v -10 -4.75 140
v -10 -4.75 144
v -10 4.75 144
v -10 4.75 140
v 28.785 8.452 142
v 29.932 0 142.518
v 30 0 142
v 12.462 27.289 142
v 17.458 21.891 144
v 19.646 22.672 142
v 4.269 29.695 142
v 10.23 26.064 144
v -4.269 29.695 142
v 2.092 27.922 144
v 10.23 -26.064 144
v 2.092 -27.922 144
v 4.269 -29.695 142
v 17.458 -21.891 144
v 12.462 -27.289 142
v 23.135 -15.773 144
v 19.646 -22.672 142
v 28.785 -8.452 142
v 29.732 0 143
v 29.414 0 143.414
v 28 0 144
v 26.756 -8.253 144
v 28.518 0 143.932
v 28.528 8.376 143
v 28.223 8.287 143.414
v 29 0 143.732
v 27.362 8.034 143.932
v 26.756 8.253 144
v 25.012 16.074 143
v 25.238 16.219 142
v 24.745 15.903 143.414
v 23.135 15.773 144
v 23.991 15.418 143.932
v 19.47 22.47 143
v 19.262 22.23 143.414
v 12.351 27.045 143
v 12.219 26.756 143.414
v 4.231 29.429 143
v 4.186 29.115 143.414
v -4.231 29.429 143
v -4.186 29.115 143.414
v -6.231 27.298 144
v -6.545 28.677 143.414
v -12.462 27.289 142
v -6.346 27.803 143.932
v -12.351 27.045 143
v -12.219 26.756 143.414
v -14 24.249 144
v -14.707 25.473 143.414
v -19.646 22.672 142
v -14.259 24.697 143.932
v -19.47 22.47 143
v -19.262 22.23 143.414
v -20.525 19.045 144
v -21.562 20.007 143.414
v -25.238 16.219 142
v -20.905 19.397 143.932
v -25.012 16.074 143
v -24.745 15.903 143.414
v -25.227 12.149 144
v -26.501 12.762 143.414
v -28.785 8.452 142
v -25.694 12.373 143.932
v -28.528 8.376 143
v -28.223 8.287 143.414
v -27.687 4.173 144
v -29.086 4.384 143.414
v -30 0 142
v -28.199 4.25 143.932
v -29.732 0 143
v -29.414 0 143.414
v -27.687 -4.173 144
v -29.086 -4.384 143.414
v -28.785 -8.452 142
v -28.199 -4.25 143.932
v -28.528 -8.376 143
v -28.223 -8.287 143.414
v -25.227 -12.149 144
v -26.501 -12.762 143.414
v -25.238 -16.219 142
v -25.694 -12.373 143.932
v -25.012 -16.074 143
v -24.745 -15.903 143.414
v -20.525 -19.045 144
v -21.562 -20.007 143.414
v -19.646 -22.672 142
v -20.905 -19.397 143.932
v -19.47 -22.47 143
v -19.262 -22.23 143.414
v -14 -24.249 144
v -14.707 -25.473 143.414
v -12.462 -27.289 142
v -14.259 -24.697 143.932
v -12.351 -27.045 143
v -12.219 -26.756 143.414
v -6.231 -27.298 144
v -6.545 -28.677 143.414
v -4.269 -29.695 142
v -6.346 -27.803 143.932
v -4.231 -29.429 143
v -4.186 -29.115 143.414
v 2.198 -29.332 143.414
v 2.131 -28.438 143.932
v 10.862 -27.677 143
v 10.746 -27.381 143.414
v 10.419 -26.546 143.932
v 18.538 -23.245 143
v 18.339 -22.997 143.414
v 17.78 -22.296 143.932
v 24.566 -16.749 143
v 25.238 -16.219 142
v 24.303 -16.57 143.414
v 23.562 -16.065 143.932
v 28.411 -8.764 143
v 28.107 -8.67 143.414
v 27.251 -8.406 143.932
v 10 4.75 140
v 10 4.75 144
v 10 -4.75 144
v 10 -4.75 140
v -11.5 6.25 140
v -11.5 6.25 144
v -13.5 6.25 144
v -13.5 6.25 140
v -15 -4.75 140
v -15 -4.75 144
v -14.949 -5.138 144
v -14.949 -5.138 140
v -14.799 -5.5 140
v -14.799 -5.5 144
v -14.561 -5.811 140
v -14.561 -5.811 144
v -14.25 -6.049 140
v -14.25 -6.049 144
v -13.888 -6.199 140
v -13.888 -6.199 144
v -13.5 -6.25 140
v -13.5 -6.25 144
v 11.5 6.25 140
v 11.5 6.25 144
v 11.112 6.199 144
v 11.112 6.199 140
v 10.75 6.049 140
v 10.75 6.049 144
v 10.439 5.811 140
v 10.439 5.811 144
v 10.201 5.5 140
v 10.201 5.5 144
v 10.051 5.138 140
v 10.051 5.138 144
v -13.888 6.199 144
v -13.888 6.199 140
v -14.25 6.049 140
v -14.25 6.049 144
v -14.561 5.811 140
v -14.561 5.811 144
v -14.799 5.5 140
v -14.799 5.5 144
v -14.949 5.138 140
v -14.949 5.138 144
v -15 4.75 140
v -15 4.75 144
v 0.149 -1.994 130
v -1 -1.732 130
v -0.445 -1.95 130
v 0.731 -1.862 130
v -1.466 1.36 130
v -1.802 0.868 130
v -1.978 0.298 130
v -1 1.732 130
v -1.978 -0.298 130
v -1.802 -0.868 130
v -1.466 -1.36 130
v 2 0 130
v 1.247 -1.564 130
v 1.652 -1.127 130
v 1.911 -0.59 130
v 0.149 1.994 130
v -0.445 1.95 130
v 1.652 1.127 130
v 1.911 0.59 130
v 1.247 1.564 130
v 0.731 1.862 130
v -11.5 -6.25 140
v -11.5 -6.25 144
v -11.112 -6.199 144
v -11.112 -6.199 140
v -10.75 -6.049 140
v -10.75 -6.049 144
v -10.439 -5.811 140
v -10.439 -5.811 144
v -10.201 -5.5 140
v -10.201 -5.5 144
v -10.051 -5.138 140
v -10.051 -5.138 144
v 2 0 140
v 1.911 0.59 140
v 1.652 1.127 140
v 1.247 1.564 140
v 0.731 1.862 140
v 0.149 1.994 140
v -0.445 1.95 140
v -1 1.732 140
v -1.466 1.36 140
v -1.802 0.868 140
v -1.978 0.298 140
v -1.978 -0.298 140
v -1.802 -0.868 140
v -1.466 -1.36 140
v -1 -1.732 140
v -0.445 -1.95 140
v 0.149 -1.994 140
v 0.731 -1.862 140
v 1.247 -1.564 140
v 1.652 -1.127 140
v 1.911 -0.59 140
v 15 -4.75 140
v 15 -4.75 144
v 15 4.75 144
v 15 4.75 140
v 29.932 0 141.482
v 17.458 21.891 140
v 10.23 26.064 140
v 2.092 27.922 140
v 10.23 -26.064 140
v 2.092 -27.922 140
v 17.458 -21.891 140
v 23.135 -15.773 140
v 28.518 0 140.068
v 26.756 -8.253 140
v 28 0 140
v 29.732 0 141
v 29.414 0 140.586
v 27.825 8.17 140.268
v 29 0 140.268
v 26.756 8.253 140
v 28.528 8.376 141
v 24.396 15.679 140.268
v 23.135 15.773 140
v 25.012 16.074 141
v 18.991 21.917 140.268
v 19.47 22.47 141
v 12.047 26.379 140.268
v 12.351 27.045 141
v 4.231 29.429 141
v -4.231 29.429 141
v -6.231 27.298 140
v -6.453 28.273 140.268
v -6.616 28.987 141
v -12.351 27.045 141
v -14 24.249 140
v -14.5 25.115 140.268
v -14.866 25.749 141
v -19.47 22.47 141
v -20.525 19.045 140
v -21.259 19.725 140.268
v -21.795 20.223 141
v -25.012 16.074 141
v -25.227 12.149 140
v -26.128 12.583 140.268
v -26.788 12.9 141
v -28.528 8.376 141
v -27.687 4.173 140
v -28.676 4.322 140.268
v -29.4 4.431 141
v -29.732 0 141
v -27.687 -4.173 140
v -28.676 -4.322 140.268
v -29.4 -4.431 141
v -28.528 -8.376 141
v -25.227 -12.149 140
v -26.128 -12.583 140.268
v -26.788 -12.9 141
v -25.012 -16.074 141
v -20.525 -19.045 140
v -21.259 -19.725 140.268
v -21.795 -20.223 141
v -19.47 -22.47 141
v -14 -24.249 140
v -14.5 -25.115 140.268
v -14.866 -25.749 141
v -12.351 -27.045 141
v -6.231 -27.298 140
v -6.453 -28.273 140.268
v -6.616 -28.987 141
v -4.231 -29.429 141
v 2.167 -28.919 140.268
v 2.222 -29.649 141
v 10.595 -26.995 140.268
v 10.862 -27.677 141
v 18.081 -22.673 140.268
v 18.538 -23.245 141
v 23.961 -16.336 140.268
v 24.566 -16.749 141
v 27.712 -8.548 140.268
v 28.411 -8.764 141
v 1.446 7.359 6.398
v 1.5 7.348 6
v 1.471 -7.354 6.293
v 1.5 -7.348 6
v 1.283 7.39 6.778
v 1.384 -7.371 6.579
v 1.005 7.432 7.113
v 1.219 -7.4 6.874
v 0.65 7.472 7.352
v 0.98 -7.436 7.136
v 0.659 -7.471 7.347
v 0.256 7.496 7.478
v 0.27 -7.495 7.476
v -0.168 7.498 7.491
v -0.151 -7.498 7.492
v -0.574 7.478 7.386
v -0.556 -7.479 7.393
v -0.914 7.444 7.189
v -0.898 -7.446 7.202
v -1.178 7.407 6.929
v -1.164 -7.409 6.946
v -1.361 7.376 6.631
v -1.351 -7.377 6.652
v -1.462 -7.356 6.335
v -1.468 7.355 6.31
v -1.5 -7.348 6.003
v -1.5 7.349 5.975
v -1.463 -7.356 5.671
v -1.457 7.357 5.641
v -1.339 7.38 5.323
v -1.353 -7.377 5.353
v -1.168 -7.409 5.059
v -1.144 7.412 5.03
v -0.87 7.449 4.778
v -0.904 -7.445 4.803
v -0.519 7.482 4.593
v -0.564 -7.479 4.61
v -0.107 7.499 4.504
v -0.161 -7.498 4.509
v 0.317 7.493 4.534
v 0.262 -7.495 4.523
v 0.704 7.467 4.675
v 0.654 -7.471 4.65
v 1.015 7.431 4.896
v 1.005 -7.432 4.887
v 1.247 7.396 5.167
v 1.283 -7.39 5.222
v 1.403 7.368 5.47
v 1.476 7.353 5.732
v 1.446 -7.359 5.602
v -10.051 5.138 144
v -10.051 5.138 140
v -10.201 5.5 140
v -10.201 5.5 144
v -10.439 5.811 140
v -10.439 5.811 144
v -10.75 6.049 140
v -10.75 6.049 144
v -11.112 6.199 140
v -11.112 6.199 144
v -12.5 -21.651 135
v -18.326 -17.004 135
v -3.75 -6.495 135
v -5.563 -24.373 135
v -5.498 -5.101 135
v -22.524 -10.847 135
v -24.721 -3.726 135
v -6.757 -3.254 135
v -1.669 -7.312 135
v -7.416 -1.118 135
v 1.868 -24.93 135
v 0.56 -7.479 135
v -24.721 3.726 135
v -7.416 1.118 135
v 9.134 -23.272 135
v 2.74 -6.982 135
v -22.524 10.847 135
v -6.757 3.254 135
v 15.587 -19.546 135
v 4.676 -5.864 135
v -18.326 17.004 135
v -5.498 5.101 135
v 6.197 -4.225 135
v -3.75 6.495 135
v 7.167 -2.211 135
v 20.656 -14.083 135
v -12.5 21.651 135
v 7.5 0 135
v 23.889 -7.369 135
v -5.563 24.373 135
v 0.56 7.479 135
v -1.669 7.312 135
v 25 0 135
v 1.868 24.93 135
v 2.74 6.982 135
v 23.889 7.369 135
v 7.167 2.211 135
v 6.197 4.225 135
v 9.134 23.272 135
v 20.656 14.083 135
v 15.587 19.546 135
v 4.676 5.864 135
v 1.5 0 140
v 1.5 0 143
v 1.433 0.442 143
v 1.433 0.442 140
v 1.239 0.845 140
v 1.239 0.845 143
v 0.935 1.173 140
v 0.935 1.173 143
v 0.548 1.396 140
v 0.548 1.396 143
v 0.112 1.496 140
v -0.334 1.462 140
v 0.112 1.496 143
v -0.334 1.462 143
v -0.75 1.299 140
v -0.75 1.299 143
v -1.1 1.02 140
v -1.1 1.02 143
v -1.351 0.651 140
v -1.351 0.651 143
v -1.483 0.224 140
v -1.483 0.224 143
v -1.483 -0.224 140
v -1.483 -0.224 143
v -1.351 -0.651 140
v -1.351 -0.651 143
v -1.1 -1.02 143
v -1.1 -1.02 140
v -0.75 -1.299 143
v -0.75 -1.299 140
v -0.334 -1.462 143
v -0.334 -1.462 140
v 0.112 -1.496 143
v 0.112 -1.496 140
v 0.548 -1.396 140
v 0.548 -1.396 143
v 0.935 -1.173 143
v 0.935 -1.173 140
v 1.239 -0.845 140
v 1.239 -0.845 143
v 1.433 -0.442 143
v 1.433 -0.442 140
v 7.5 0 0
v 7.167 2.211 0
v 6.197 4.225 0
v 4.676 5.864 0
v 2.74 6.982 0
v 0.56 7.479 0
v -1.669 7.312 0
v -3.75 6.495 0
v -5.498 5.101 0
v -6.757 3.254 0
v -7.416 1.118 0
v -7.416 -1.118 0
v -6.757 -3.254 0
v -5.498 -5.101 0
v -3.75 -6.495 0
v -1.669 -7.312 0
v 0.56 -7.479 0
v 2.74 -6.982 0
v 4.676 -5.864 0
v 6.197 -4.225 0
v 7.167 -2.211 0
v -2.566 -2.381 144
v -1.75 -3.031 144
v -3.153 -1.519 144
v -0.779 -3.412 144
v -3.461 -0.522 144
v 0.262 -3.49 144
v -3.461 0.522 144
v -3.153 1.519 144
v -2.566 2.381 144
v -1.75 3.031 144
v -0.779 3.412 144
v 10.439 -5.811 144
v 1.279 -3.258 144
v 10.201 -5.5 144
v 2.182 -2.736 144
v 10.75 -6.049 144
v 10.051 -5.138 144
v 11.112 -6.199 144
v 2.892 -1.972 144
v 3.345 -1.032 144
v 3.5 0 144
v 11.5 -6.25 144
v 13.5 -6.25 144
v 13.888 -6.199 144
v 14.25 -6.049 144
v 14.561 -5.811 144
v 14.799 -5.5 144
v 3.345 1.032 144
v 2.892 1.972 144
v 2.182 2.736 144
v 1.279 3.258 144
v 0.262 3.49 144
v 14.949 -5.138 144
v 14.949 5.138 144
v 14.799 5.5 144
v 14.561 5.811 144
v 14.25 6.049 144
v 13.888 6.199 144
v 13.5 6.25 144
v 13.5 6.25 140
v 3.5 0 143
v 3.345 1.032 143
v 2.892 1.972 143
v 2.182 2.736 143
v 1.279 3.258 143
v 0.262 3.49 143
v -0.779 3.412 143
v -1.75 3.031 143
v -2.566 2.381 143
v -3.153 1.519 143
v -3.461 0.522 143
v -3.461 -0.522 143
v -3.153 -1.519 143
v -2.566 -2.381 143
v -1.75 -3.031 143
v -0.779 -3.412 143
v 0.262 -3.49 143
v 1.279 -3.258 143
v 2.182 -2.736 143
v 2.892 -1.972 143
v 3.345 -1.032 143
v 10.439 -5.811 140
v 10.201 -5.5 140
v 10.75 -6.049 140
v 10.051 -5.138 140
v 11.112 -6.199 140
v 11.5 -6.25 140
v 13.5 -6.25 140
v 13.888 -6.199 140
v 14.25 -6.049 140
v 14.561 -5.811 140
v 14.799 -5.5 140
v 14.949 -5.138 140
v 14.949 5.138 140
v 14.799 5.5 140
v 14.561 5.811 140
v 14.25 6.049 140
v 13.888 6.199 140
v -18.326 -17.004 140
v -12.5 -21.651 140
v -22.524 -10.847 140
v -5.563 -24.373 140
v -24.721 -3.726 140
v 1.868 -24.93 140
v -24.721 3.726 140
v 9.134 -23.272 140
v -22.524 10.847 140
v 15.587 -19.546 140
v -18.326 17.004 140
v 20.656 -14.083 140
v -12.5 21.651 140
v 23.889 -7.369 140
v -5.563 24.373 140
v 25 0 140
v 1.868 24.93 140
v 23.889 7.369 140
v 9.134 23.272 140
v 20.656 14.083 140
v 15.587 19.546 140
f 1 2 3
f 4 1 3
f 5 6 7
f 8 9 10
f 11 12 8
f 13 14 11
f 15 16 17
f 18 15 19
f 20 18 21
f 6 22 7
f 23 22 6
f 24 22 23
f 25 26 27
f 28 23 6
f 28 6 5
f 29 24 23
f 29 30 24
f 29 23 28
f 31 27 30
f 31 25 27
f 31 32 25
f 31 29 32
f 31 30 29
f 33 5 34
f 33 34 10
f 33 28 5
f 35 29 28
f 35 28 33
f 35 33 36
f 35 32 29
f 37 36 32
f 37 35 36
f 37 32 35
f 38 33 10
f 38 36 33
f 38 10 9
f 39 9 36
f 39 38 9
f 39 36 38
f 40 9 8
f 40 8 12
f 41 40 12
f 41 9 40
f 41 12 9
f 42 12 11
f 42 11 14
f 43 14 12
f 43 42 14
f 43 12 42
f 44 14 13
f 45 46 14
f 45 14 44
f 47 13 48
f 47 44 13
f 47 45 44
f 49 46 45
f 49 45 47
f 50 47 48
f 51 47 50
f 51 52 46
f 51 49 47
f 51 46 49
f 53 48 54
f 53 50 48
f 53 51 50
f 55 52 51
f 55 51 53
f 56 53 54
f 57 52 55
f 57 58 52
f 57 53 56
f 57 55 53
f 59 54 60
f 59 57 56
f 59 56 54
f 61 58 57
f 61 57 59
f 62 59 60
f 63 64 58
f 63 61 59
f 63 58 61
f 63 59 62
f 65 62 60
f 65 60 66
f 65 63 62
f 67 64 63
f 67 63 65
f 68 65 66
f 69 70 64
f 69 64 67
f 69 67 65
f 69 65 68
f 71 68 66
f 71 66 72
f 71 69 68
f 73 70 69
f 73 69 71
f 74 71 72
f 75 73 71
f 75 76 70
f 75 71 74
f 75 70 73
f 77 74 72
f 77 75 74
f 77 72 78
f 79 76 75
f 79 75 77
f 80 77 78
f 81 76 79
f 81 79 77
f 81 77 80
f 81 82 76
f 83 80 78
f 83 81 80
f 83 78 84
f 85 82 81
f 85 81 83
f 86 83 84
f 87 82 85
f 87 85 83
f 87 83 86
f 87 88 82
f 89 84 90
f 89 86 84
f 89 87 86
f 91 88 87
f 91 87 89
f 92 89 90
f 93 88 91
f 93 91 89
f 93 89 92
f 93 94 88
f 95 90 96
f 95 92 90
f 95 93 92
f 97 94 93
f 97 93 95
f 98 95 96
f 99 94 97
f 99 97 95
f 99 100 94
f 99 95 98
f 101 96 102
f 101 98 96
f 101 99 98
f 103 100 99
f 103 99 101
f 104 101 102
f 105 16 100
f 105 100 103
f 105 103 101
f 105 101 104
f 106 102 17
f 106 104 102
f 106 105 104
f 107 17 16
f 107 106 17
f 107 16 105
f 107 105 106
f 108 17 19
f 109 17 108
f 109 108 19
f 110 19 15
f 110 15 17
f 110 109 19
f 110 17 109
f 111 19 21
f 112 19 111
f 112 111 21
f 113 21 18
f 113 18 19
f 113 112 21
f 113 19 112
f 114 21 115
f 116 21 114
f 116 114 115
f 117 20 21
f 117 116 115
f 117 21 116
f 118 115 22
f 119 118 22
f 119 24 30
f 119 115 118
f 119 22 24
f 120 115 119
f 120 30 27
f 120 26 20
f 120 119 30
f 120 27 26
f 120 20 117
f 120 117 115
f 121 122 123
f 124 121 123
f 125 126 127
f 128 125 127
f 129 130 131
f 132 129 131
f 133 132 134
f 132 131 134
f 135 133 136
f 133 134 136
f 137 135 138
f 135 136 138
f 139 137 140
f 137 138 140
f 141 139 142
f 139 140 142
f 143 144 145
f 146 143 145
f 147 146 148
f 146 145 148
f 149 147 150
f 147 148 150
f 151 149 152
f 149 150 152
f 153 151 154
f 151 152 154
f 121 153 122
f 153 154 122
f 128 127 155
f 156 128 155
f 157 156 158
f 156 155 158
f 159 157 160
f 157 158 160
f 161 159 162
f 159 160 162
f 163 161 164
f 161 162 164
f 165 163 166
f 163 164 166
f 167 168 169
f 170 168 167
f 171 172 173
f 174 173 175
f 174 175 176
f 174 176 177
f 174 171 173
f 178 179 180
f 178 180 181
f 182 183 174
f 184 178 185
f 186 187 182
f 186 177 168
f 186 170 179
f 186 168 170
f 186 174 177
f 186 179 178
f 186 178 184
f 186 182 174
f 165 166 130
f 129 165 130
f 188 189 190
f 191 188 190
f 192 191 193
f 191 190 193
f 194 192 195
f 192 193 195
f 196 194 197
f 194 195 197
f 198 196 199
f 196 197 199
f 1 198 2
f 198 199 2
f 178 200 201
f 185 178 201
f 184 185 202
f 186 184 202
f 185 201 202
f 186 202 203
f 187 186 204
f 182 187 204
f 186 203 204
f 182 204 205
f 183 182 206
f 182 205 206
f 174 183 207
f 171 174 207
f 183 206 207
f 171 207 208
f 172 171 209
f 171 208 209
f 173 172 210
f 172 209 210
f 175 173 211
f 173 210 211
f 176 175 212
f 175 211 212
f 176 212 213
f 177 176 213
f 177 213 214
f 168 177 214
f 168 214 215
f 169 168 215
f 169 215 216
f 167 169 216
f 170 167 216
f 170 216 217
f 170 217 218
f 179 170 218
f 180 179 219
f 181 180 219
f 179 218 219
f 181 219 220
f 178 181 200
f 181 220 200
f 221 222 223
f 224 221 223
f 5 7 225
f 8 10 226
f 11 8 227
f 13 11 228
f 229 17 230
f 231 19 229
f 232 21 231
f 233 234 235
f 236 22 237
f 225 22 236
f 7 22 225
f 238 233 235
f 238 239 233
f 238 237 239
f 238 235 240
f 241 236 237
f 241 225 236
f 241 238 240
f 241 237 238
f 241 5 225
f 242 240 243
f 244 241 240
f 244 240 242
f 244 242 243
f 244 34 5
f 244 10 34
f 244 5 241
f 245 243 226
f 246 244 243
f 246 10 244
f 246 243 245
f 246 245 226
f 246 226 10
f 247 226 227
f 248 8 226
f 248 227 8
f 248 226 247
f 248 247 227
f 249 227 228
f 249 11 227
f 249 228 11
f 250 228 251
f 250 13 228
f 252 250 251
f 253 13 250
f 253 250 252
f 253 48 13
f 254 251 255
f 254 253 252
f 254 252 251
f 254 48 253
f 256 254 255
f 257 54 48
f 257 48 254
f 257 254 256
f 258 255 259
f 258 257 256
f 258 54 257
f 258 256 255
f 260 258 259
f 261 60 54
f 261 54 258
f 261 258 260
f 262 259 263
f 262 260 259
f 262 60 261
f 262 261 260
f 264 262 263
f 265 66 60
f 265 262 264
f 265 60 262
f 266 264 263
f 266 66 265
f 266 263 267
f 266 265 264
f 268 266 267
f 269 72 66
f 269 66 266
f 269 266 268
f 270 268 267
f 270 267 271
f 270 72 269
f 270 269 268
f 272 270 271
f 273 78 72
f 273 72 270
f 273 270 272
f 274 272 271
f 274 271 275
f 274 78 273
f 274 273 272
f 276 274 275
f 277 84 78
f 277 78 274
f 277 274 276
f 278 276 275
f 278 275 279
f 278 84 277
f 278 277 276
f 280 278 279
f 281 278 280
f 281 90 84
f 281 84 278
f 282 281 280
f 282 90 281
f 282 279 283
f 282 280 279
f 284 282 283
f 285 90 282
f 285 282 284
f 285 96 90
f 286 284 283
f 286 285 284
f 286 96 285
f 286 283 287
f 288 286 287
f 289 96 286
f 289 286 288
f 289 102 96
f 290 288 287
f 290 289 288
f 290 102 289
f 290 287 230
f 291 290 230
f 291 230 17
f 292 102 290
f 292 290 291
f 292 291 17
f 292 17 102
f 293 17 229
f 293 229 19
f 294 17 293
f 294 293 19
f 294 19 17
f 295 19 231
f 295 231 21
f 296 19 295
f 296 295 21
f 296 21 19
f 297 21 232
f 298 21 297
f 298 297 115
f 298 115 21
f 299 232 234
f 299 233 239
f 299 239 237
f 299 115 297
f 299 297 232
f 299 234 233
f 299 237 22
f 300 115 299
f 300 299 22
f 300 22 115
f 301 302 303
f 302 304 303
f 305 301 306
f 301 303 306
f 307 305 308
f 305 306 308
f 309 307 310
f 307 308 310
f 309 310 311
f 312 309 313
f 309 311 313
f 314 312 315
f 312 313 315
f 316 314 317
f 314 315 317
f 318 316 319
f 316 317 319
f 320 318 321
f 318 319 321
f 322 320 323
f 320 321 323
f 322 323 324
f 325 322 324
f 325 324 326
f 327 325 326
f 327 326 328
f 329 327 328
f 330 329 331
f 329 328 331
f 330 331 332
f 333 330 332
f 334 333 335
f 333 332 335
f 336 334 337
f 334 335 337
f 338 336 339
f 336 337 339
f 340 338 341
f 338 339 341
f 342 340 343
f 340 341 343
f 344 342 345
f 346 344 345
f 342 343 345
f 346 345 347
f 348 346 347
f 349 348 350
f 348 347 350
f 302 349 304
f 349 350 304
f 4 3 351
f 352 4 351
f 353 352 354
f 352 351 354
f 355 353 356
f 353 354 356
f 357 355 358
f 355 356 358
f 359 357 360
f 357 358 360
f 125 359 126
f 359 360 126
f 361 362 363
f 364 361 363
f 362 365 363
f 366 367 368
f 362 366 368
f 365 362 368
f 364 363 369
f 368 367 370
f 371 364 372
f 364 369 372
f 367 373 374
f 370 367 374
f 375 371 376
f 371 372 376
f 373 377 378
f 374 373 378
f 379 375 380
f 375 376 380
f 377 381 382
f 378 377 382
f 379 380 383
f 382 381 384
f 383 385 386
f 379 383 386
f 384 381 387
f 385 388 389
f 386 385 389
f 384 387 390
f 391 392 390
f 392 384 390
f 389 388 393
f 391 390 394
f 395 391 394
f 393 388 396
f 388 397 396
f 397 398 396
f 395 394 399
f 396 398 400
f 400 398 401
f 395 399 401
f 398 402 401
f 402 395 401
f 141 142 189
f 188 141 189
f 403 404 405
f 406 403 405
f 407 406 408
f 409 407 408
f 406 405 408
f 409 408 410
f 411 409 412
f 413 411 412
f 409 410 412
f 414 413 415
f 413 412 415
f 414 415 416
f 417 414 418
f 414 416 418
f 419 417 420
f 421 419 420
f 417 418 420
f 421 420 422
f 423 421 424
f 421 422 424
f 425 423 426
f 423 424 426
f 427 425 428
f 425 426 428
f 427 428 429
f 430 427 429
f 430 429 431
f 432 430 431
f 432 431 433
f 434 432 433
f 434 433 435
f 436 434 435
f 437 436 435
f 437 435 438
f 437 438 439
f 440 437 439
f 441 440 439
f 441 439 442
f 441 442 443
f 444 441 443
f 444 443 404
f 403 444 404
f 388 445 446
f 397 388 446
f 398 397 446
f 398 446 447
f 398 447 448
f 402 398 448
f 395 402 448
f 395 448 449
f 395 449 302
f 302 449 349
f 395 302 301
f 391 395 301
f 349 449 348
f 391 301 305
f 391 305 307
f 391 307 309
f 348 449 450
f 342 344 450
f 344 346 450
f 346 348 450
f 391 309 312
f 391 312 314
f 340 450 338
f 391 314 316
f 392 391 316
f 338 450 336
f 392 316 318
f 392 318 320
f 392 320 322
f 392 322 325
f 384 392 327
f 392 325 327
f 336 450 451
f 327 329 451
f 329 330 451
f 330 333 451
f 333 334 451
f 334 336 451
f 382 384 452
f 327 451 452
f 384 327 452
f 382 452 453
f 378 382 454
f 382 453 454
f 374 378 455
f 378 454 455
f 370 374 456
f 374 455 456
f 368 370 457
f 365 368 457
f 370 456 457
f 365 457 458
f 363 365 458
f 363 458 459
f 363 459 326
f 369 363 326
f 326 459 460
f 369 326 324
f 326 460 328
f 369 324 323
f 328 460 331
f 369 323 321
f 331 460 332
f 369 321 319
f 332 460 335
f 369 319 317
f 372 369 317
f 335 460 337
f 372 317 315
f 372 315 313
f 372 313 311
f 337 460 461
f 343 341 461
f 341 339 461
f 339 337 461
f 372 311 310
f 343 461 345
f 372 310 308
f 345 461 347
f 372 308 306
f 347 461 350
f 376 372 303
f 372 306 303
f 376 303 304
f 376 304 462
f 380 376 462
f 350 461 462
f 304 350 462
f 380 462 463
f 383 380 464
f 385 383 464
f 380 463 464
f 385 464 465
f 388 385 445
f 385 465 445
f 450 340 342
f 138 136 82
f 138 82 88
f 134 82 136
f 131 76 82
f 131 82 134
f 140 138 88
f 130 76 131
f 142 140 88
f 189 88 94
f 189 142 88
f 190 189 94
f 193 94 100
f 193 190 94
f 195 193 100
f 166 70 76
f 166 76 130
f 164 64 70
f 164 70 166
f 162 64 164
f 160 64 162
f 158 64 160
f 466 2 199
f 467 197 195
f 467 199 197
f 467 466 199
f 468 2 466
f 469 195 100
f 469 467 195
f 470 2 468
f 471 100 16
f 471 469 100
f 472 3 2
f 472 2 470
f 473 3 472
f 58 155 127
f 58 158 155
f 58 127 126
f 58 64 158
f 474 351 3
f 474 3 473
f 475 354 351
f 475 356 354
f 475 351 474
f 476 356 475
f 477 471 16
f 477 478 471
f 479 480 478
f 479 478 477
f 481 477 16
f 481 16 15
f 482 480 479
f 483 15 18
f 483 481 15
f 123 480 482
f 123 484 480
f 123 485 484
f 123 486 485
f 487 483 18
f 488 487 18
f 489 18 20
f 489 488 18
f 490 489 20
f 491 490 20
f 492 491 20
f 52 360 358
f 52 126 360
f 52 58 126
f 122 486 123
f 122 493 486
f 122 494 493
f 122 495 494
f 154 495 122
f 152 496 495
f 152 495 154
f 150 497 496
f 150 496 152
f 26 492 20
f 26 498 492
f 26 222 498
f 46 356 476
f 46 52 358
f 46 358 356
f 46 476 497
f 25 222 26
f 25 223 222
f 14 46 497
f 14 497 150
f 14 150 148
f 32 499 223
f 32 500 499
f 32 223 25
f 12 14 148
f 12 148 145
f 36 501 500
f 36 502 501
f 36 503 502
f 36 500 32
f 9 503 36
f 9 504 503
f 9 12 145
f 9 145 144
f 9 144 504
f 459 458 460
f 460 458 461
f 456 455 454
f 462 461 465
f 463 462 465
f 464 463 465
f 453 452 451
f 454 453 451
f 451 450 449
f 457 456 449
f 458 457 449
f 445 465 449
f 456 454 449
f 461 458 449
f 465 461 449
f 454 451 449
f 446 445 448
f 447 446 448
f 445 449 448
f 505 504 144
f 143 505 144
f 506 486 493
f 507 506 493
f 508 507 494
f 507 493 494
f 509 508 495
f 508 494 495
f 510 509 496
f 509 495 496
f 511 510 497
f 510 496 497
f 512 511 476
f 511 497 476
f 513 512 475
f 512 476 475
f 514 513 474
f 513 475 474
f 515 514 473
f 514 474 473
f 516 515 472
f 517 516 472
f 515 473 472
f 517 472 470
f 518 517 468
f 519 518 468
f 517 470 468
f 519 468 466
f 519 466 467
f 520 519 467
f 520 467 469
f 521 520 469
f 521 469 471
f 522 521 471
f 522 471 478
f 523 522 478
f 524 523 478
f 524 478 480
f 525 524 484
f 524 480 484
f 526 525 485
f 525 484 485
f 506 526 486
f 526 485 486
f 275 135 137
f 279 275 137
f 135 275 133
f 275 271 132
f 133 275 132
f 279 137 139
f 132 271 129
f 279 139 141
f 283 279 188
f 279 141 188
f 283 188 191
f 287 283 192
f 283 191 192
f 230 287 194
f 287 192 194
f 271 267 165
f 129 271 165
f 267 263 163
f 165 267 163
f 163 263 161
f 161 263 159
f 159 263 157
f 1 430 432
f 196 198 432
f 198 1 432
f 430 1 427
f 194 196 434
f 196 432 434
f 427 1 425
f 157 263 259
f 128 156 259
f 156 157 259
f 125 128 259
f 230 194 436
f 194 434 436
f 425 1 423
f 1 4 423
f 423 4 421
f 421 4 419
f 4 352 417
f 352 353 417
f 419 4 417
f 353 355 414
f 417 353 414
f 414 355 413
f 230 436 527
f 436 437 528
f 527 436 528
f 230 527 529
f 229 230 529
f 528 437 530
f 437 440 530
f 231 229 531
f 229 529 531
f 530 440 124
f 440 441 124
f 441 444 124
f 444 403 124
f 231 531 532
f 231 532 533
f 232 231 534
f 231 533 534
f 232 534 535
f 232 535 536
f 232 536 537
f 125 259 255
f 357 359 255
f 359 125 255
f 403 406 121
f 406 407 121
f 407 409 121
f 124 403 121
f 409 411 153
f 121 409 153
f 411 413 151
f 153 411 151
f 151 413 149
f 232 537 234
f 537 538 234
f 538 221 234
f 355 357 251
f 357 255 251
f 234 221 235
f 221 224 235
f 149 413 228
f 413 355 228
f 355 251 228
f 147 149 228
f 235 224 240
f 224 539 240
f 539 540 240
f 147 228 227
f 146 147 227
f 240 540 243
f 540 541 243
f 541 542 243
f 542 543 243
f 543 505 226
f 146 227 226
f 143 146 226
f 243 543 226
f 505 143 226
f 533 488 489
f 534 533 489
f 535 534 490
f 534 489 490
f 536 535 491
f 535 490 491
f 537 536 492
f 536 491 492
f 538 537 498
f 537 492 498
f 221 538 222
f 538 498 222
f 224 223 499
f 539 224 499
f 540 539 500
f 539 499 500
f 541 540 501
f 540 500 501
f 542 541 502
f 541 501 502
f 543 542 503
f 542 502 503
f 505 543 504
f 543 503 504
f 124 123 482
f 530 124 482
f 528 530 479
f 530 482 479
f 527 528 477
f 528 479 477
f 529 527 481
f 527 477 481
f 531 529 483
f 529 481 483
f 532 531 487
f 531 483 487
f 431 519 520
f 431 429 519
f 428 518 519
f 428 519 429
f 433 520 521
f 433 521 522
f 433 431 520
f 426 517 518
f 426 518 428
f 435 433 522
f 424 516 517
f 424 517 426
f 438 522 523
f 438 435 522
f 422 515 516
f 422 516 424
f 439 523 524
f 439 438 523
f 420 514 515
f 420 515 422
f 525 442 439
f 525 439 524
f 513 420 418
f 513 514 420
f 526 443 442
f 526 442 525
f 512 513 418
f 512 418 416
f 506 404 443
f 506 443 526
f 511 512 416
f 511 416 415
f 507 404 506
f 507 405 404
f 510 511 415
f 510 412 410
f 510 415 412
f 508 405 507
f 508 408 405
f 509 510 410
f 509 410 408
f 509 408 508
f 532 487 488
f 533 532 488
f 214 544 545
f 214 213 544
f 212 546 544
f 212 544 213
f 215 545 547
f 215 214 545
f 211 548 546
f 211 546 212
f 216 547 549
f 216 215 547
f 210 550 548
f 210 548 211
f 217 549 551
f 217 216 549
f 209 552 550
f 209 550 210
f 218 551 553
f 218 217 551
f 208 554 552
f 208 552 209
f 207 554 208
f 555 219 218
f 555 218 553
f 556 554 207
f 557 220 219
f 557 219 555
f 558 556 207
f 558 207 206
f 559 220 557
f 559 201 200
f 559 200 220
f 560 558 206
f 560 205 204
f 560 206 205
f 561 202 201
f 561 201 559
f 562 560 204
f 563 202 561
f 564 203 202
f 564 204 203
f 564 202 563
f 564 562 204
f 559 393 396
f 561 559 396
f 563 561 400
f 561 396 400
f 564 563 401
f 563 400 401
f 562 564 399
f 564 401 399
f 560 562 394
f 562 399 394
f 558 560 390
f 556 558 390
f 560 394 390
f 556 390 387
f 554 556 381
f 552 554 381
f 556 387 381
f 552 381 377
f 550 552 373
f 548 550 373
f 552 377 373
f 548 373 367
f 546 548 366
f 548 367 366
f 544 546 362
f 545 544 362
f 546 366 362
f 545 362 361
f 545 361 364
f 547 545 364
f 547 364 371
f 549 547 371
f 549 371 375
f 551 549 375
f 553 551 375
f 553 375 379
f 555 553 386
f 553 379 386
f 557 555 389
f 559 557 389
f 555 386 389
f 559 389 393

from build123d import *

# Parameters (mm, degrees)
F0_R          = 7.5
F1_DEPTH      = 135
F2_R          = 25
F3_DEPTH      = 5
F4_R          = 1.5
F5_DEPTH      = 7.5
F5_DEPTH_BACK = 7.5
F6_R          = 2
F7_DEPTH      = 10
F8_R          = 30
F8_R_2        = 2
F9_DEPTH      = 4
F11_DEPTH     = 4
F12_R         = 2
F12_R_2       = 1.5
F13_DEPTH     = 4
F12_R_3       = 3.5
F14_DEPTH     = 1
F15_R         = 1.99999


# Not quite as in the source:
# - a fillet or chamfer is up to 0.001 mm smaller than in the source, because OpenCascade refuses the exact size


with BuildPart() as f1:
    # F0 (on Top) → F1 (new body)
    with BuildSketch(Plane.XY):
        Circle(F0_R)
    extrude(amount=F1_DEPTH)

    # F2 (on face) → F3 (join)
    with BuildSketch(Plane.XY.offset(135)):
        Circle(F2_R)
    extrude(amount=F3_DEPTH)

    # F4 (on Front) → F5 (cut, two sides)
    with BuildSketch(Plane.XZ) as f5_sk:
        with Locations((0, 6)):
            Circle(F4_R)
    extrude(amount=-F5_DEPTH, mode=Mode.SUBTRACT)
    extrude(f5_sk.sketch, amount=F5_DEPTH_BACK, mode=Mode.SUBTRACT)

    # F6 (on face) → F7 (cut)
    with BuildSketch(Plane.XY.offset(140)):
        Circle(F6_R)
    extrude(amount=-F7_DEPTH, mode=Mode.SUBTRACT)


with BuildPart() as f9:
    # F8 (on face) → F9 (new body)
    with BuildSketch(Plane.XY.offset(140)):
        Circle(F8_R)
        Circle(F8_R_2, mode=Mode.SUBTRACT)
    extrude(amount=F9_DEPTH)

    # F10 (on face) → F11 (cut, through all)
    with BuildSketch(Plane.XY.offset(144)):
        with BuildLine():
            Line((13.5, 6.25), (11.5, 6.25))
            ThreePointArc((11.5, 6.25), (10.4393398282, 5.8106601718), (10, 4.75))
            Line((10, 4.75), (10, -4.75))
            ThreePointArc((10, -4.75), (10.4393398282, -5.8106601718), (11.5, -6.25))
            Line((11.5, -6.25), (13.5, -6.25))
            ThreePointArc((13.5, -6.25), (14.5606601718, -5.8106601718), (15, -4.75))
            Line((15, -4.75), (15, 4.75))
            ThreePointArc((15, 4.75), (14.5606601718, 5.8106601718), (13.5, 6.25))
        make_face()
        with BuildLine():
            ThreePointArc((-10, 4.75), (-10.4393398282, 5.8106601718), (-11.5, 6.25))
            Line((-11.5, 6.25), (-13.5, 6.25))
            ThreePointArc((-13.5, 6.25), (-14.5606601718, 5.8106601718), (-15, 4.75))
            Line((-15, 4.75), (-15, -4.75))
            ThreePointArc((-15, -4.75), (-14.5606601718, -5.8106601718), (-13.5, -6.25))
            Line((-13.5, -6.25), (-11.5, -6.25))
            ThreePointArc((-11.5, -6.25), (-10.4393398282, -5.8106601718), (-10, -4.75))
            Line((-10, -4.75), (-10, 4.75))
        make_face()
    extrude(amount=-F11_DEPTH, mode=Mode.SUBTRACT)

    # F12 (on face) → F13 (join, through all)
    with BuildSketch(Plane.XY.offset(144)):
        Circle(F12_R)
        Circle(F12_R_2, mode=Mode.SUBTRACT)
    extrude(amount=-F13_DEPTH)

    # F12 (on face) → F14 (cut)
    with BuildSketch(Plane.XY.offset(144)):
        Circle(F12_R_3)
        Circle(F12_R, mode=Mode.SUBTRACT)
        Circle(F12_R)
        Circle(F12_R_2, mode=Mode.SUBTRACT)
    extrude(amount=-F14_DEPTH, mode=Mode.SUBTRACT)

    # F15 (radius 2 in the source; OpenCascade refuses exactly that, so slightly less here)
    f15_edges = [f9.edges().sort_by_distance(p)[0] for p in [
        (-30, 0, 144),
        (-30, 0, 140),
    ]]
    fillet(f15_edges, radius=F15_R)


solid = Compound([f1.part, f9.part])
